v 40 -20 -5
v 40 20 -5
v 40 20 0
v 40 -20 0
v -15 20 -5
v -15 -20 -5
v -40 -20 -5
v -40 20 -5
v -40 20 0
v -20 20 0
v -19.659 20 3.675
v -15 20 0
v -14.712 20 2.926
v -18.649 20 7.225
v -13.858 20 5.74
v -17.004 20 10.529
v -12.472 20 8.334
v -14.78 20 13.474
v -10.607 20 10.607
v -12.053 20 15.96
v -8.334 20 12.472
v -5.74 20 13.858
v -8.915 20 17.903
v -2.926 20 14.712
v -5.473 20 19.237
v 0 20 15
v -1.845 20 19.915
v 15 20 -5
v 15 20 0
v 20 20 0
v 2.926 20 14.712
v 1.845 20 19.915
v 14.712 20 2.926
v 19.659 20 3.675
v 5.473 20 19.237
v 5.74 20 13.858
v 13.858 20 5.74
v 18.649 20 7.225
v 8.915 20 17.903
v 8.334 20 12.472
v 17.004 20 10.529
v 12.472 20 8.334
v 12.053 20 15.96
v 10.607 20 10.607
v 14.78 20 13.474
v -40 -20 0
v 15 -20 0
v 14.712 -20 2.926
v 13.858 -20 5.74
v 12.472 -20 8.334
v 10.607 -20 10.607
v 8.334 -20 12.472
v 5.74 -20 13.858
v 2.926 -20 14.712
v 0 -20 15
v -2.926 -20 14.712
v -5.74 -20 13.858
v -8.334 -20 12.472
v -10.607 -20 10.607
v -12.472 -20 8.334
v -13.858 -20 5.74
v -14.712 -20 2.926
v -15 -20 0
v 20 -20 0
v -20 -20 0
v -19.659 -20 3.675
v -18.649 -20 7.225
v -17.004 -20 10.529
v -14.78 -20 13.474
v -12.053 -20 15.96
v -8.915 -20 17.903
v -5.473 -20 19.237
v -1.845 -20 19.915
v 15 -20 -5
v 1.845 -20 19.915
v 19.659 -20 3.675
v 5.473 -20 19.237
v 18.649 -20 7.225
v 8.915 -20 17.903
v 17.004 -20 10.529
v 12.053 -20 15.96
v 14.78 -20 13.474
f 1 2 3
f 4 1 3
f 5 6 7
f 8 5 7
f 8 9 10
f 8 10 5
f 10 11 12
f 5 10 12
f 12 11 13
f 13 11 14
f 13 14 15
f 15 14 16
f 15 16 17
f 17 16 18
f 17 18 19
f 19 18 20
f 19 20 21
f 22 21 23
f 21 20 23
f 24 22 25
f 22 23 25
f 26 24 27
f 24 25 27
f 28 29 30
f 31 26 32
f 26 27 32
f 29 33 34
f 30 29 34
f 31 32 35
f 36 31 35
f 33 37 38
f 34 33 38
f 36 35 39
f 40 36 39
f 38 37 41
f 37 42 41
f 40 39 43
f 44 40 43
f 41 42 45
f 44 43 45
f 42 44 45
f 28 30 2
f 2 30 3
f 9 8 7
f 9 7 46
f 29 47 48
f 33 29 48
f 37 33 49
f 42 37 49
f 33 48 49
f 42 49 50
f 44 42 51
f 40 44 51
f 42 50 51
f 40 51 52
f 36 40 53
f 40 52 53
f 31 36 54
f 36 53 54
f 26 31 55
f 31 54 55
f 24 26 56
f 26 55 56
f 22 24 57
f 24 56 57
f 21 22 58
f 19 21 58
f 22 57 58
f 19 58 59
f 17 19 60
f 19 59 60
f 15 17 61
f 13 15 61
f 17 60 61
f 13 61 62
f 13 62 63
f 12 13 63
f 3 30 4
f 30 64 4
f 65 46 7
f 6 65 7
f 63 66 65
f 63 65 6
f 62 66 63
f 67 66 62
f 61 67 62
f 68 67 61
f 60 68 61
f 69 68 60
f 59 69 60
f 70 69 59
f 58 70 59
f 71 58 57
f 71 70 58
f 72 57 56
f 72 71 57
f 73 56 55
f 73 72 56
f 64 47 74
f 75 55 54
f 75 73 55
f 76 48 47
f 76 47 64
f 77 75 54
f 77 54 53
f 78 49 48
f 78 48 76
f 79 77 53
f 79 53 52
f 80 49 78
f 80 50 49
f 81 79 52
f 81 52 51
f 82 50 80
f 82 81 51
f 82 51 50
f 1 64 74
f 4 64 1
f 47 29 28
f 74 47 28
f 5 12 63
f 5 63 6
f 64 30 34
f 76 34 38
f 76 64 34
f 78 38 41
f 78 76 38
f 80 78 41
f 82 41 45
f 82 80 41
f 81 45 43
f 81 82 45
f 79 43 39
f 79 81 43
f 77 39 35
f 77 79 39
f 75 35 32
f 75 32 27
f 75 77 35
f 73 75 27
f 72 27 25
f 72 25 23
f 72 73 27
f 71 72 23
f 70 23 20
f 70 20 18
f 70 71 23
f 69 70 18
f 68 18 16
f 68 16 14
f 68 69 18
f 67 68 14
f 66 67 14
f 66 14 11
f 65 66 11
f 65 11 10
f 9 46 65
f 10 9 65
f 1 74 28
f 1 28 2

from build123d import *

# Parameters (mm, degrees)
PAD_DEPTH = 20


with BuildPart() as part:
    # Sketch → Pad (new body, symmetric)
    with BuildSketch(Plane.XZ):
        with BuildLine():
            ThreePointArc((20, 0), (0, 20), (-20, 0))
            Line((-40, 0), (-20, 0))
            Line((-40, -5), (-40, 0))
            Line((-15, -5), (-40, -5))
            Line((-15, 0), (-15, -5))
            ThreePointArc((15, 0), (0, 15), (-15, 0))
            Line((15, 0), (15, -5))
            Line((15, -5), (40, -5))
            Line((40, -5), (40, 0))
            Line((20, 0), (40, 0))
        make_face()
    extrude(amount=PAD_DEPTH, both=True)


solid = part.part
